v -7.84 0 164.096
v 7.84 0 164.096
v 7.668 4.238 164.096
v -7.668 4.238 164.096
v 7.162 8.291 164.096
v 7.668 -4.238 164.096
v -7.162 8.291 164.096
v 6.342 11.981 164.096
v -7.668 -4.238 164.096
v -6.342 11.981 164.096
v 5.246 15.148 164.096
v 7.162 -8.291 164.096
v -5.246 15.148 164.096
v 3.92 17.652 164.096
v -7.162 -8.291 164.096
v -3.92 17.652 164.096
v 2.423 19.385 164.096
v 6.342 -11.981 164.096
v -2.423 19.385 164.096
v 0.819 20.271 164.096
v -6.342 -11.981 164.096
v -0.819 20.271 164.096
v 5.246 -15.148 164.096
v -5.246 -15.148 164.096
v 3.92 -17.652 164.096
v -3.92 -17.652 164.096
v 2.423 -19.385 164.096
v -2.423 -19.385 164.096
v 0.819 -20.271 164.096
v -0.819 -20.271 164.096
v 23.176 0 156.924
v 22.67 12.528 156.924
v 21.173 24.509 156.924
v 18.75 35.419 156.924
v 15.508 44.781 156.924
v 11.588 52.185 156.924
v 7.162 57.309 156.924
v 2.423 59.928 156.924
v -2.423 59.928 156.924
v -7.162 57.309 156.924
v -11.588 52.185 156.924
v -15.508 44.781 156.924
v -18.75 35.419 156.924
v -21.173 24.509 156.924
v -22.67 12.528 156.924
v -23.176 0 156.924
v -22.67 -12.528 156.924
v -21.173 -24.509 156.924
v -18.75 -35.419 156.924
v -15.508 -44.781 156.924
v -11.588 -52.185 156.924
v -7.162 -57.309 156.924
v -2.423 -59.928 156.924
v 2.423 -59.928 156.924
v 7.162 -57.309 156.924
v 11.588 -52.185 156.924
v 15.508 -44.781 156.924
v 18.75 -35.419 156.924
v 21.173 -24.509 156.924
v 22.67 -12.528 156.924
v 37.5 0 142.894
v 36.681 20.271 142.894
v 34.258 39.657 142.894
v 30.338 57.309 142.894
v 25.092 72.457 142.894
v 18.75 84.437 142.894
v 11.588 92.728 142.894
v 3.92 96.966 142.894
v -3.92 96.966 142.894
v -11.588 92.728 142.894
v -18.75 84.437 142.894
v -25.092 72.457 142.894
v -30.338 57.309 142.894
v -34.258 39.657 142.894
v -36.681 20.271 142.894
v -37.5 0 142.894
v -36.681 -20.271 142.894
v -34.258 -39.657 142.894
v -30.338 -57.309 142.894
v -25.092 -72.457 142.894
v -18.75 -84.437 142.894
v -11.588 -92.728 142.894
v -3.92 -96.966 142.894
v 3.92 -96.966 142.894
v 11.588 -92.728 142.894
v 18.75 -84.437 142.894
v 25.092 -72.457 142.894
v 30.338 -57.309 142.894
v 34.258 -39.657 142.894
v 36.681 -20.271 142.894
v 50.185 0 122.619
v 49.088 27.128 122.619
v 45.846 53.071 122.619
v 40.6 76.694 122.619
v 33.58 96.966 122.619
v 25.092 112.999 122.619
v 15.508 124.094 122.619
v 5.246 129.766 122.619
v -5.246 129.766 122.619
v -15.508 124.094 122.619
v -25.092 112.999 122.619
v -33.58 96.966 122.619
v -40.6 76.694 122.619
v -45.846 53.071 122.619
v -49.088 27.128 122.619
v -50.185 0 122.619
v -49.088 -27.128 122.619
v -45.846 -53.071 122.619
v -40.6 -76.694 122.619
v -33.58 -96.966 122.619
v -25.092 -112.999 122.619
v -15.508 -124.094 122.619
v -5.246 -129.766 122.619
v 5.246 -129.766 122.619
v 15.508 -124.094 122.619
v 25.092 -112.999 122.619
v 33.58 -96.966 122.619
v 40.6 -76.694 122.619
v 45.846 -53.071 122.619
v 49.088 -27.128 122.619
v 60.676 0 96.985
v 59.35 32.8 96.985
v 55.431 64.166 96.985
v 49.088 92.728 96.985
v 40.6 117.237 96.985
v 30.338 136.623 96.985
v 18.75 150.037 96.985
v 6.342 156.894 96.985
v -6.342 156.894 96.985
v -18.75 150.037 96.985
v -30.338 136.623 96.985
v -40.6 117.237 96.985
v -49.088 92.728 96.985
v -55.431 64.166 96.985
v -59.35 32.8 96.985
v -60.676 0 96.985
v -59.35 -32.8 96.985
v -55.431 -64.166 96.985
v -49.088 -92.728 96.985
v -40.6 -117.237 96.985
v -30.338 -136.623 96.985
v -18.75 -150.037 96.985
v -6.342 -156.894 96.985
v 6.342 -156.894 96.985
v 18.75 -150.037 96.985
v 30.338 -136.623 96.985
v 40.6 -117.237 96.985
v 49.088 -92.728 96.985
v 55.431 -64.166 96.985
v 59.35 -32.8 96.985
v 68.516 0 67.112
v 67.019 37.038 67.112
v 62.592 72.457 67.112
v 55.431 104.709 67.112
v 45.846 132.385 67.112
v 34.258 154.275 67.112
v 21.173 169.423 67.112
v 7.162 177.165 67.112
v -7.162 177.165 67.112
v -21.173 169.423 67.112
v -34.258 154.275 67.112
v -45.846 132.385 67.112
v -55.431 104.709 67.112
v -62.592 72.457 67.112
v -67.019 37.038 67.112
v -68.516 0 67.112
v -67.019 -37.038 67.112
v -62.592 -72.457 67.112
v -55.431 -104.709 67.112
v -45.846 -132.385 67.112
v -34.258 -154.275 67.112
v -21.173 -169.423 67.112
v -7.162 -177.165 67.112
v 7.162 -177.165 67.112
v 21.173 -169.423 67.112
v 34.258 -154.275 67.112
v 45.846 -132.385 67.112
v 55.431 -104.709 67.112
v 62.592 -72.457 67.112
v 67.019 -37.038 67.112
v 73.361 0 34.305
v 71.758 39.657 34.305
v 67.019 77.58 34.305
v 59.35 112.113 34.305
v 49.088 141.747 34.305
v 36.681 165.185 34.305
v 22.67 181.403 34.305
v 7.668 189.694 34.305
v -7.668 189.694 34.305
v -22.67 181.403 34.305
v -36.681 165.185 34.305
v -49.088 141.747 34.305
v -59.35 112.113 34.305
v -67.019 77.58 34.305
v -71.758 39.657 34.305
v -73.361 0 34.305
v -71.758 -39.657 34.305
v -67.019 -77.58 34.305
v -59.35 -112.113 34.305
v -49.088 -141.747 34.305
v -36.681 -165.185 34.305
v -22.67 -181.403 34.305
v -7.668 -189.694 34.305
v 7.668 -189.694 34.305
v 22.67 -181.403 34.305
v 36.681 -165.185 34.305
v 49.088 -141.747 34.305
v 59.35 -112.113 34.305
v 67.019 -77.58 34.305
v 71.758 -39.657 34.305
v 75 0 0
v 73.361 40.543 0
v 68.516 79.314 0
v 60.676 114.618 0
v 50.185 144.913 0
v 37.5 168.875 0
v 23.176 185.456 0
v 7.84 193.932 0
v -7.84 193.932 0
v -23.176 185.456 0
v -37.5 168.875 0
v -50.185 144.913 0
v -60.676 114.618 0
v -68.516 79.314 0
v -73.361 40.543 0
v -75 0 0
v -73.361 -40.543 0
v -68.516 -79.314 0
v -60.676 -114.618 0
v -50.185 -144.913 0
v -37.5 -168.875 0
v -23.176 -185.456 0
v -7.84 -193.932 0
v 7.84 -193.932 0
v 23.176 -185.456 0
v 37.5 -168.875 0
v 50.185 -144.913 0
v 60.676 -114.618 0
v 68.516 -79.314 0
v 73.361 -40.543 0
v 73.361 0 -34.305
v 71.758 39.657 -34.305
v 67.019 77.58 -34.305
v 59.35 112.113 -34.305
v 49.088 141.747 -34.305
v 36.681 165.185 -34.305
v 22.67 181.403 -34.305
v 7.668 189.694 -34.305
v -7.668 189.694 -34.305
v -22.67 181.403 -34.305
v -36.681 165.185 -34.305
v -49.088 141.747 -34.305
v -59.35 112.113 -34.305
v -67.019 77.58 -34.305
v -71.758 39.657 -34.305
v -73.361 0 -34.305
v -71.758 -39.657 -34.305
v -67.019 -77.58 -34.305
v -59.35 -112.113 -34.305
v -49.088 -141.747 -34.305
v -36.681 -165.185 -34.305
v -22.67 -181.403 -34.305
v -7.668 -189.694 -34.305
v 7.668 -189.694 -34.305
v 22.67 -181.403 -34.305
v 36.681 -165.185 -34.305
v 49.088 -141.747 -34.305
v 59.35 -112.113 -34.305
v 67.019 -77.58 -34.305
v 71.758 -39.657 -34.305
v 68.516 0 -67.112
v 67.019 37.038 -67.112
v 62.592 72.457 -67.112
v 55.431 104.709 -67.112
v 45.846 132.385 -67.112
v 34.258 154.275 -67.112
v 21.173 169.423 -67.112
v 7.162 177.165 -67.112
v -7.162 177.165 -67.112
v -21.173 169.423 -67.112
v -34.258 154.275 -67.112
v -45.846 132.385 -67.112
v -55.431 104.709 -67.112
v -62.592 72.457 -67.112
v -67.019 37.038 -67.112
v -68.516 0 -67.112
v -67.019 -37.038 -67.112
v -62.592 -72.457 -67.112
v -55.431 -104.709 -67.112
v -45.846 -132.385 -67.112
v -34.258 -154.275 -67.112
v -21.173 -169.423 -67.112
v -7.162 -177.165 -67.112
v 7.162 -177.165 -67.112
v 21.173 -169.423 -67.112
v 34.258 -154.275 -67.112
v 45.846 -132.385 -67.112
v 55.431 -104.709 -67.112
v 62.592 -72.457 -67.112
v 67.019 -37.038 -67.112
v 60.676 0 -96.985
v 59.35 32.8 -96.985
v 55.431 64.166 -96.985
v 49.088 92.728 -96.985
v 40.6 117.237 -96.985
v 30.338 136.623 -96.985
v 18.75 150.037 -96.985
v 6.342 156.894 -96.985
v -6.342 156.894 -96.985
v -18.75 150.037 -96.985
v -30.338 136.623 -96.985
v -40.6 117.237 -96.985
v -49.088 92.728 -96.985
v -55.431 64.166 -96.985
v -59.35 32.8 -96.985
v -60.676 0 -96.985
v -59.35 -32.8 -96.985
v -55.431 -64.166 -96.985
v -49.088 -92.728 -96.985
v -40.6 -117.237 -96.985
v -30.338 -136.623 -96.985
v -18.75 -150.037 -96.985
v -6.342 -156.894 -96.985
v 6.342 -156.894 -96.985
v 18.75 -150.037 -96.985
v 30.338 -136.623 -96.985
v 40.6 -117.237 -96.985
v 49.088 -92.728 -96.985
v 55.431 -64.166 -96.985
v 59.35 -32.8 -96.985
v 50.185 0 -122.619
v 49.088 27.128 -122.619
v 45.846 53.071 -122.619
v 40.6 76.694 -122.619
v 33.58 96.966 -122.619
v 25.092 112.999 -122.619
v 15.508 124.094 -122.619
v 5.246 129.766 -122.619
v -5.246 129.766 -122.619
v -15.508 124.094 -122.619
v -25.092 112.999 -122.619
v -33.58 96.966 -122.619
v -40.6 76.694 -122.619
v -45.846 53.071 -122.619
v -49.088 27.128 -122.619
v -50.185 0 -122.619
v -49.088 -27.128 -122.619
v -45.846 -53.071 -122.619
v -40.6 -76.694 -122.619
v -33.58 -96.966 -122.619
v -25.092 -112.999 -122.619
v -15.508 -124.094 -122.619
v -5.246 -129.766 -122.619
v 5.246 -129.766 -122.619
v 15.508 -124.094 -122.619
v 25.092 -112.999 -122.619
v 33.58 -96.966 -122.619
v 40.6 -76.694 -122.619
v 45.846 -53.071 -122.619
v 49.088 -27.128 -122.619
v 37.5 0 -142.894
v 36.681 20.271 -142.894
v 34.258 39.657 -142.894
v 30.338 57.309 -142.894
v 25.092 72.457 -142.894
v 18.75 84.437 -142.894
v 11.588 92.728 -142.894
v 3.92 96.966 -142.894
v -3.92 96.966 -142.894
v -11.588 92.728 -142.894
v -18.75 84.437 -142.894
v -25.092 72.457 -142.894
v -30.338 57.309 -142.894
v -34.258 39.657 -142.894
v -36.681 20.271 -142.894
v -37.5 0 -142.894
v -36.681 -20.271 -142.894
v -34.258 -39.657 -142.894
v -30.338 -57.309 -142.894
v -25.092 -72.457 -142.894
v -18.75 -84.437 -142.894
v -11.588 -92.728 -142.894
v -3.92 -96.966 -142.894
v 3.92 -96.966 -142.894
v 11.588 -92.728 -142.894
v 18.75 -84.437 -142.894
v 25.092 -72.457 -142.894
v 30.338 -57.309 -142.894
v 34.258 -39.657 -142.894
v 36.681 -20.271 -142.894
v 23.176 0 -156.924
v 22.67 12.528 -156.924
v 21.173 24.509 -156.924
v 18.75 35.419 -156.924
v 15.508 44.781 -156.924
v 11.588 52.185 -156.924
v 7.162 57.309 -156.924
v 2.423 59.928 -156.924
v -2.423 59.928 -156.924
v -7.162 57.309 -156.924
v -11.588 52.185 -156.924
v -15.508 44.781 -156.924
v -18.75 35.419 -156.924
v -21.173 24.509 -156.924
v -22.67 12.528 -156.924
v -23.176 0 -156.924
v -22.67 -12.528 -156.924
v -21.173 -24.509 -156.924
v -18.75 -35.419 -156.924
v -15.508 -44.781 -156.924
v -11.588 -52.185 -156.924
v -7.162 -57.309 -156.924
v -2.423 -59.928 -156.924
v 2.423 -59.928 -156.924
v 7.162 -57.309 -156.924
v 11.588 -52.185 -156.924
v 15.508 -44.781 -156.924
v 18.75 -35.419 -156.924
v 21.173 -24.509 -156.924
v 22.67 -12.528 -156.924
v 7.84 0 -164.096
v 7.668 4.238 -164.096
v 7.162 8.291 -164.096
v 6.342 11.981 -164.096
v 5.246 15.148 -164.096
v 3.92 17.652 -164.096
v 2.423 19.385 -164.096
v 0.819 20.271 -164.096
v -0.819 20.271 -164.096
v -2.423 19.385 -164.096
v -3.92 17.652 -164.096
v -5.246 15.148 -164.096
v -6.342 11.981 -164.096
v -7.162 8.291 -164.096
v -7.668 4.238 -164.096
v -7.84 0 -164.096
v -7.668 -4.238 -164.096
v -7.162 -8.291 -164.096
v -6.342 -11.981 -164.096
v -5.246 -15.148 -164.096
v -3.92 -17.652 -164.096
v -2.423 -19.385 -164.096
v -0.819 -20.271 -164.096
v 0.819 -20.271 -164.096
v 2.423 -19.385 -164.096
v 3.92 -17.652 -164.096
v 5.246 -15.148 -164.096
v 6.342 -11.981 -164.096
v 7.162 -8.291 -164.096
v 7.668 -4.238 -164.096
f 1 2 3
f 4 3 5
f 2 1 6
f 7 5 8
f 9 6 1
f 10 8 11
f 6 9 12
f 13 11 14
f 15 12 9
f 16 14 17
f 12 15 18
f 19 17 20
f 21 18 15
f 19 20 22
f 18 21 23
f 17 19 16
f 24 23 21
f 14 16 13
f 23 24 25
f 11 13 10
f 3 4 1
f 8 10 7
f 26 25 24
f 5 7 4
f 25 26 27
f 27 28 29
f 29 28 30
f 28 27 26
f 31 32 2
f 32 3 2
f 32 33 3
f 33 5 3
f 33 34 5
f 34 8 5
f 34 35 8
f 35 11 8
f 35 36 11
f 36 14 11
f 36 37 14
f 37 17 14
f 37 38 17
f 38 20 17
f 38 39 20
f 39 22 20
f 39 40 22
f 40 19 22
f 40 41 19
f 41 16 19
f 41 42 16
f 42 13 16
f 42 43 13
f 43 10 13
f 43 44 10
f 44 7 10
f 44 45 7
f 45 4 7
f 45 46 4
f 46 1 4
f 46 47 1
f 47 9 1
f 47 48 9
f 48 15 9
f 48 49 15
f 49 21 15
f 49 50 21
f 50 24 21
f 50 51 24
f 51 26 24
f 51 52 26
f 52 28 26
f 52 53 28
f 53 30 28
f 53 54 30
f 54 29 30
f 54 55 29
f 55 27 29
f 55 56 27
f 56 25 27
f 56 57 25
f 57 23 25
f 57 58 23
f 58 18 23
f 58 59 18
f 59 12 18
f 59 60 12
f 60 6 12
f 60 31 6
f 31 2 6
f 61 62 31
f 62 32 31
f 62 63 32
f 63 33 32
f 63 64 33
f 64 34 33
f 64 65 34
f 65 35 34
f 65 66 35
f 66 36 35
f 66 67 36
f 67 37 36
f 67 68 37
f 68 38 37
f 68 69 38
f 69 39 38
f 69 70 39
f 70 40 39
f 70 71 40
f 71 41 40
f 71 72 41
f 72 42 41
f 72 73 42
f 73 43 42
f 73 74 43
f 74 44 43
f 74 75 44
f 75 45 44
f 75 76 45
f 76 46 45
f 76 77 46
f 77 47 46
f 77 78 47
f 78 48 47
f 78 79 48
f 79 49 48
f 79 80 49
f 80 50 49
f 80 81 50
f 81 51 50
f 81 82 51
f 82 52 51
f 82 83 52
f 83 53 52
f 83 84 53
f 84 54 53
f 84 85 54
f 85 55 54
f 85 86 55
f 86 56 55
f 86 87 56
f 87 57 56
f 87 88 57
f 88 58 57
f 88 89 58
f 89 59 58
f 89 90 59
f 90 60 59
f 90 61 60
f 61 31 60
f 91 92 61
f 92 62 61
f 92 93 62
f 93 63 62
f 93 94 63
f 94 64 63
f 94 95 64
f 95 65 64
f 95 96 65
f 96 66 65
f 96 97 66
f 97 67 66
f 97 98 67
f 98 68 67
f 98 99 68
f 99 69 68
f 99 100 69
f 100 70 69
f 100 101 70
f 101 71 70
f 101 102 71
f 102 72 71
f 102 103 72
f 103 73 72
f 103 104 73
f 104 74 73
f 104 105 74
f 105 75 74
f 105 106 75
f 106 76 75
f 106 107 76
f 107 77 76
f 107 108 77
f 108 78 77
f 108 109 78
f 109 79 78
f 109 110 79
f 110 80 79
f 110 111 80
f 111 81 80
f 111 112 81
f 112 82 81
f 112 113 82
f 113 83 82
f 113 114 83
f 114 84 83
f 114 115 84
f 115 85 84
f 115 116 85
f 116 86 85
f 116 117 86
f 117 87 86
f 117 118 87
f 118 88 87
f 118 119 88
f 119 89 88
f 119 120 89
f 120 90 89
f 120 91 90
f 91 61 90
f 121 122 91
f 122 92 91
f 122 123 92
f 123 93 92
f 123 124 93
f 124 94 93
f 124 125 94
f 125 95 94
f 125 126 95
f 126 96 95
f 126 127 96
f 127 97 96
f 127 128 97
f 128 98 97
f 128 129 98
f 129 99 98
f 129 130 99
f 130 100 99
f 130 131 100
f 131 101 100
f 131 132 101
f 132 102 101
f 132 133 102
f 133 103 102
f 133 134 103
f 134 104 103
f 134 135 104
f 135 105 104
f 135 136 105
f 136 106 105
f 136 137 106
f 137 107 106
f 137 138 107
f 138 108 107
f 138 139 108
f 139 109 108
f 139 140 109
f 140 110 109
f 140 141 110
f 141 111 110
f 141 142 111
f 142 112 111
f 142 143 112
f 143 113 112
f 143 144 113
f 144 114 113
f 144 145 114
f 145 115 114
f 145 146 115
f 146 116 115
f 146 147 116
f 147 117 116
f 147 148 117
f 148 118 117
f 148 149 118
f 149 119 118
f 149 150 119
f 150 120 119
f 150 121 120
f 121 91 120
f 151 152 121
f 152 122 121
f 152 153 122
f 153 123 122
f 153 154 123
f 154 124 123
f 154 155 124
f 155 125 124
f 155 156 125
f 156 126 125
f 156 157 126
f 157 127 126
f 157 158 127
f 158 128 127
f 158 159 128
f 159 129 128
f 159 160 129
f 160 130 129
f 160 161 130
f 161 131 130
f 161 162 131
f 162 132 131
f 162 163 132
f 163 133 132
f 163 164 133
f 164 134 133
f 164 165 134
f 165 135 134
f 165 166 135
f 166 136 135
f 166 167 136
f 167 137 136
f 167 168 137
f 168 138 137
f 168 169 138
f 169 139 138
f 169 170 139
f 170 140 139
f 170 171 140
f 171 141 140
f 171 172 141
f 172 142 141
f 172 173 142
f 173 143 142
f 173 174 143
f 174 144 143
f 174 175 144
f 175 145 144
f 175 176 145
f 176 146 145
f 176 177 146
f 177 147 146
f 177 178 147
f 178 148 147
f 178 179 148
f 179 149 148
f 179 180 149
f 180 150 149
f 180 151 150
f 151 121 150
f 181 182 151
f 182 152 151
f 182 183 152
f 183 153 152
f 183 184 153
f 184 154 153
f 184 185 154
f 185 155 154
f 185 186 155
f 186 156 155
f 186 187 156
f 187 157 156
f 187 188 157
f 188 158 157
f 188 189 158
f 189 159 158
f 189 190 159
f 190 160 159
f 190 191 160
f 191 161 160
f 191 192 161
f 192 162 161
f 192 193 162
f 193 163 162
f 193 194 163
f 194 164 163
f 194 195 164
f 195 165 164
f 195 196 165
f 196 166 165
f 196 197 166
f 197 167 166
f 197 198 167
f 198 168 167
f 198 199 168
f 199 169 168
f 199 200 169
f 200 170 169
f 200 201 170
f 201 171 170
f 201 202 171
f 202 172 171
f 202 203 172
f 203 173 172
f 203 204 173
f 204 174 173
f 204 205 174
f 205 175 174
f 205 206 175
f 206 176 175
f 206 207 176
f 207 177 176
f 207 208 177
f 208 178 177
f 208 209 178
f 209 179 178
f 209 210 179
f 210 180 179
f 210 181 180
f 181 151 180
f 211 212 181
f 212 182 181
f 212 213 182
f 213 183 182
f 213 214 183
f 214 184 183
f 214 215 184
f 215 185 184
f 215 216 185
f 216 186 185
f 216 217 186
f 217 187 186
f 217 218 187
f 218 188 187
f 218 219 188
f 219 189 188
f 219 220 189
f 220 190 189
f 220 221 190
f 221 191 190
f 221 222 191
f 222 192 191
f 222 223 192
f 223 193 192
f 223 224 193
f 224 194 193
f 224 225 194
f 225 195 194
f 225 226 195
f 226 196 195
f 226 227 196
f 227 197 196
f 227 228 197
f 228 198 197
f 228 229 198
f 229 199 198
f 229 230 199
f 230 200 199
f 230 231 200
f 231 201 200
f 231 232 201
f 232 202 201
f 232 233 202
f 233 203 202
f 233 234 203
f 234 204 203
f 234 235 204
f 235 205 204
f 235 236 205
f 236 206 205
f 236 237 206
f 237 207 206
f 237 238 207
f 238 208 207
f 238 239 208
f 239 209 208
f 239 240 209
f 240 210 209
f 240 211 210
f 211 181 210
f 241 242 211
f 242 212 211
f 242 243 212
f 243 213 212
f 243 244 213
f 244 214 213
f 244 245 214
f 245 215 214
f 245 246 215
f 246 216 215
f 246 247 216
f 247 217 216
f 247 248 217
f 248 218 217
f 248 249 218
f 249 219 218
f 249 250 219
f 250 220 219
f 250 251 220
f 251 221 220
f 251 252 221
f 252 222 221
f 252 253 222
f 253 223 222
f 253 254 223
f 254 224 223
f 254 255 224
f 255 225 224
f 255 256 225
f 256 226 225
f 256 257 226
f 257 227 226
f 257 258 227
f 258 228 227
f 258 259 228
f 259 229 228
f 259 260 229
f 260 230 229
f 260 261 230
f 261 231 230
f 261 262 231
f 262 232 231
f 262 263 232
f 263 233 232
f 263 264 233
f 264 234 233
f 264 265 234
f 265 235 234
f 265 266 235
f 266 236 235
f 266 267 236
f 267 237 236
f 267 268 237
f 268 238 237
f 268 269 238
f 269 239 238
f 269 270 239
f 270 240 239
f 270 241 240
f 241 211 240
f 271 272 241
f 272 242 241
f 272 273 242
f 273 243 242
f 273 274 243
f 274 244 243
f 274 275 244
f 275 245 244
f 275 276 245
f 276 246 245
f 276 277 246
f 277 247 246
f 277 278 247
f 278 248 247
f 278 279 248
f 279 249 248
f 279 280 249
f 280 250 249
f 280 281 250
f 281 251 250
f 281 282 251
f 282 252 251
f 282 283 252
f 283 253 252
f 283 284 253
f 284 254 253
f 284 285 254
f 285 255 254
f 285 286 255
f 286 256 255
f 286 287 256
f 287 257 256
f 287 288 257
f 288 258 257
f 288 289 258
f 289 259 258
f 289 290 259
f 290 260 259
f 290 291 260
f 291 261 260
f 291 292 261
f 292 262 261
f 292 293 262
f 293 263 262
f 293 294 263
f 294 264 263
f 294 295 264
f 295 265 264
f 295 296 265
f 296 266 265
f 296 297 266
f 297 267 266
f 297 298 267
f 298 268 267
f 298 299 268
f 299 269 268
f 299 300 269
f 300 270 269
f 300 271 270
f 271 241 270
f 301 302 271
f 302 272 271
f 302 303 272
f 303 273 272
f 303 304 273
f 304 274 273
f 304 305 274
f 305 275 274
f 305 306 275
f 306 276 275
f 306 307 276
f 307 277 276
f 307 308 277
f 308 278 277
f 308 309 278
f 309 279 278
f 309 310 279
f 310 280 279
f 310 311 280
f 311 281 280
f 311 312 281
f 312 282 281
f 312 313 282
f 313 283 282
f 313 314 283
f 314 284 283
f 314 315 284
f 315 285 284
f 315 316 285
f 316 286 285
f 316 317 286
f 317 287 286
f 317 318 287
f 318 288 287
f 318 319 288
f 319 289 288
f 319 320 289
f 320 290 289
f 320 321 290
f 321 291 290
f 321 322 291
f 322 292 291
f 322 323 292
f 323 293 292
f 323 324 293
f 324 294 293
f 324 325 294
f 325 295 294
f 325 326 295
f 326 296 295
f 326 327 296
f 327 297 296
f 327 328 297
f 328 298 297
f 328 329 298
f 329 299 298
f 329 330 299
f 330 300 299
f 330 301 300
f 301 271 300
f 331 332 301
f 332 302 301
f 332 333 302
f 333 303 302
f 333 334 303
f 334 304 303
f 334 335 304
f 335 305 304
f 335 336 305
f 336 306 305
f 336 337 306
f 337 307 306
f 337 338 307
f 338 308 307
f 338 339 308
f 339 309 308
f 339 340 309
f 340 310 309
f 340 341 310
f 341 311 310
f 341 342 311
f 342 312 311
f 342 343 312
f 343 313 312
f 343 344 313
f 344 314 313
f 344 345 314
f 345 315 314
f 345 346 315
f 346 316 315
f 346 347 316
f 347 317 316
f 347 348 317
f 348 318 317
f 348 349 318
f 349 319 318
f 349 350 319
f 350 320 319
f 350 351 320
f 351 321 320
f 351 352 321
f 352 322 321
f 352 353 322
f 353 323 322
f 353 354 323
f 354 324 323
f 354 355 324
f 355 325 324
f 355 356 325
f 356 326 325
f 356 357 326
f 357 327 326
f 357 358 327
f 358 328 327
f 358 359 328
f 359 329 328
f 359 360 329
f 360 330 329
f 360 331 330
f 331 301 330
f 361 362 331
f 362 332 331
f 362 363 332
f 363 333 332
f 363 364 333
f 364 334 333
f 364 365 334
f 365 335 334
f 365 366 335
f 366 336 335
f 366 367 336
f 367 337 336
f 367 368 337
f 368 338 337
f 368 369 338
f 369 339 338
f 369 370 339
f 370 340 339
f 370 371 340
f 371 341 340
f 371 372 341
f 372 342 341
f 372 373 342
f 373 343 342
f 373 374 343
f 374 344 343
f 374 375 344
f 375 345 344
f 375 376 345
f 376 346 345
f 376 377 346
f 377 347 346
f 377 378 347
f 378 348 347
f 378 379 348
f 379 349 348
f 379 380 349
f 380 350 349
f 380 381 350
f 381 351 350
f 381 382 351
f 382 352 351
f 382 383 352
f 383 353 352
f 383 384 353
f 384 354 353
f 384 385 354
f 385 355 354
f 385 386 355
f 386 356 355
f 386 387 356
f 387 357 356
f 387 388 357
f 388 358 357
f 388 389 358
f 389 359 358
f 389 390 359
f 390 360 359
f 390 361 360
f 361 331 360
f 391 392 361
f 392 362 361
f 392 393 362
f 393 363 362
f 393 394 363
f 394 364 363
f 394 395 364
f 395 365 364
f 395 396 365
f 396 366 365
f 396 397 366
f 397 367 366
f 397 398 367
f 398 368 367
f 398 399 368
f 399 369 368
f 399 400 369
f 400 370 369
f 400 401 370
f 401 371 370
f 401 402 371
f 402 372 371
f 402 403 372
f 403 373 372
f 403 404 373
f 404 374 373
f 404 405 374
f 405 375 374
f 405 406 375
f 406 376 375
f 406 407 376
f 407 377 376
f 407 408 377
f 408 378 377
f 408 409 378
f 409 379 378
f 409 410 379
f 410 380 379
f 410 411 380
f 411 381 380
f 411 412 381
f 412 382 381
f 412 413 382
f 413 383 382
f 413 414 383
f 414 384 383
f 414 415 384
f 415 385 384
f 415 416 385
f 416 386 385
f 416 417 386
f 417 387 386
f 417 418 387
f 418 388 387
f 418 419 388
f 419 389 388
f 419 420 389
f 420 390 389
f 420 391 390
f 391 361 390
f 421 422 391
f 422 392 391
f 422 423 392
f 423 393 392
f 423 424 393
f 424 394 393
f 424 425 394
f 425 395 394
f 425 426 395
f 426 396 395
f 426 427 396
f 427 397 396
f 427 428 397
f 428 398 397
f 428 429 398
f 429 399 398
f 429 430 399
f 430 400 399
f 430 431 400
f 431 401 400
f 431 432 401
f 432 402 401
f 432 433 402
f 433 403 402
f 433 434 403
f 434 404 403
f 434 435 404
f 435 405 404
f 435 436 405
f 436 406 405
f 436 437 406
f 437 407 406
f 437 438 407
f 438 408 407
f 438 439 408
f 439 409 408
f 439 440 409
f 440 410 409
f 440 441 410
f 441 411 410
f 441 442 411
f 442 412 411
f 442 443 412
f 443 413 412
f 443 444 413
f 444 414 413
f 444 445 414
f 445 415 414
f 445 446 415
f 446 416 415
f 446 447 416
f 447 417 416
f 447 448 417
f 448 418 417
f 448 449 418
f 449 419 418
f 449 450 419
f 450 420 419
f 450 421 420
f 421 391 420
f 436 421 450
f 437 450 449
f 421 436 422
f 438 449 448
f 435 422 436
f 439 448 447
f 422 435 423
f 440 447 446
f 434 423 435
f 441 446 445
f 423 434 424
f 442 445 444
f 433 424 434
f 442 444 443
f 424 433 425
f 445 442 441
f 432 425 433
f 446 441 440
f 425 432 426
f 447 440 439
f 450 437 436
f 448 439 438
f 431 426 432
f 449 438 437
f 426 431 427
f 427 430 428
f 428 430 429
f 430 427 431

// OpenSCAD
// Generated by SolidPython 1.0.1 on 2020-07-29 00:46:46


scale(v = [5, 13, 11]) {
	sphere(r = 15);
}
/***********************************************
*********      SolidPython code:      **********
************************************************
 
# import packages: SolidPython
from solid import *
from solid.utils import *
from itertools import chain, combinations, permutations


class Resize:

    def __init__(self, scad_file):
        self.scad_file = scad_file
        #self.scad_file = import_scad(scad_file)
        # cone/cylinder param:
        self.r1 = 0
        self.r2 = 0
        self.h = 0
        # rectangular prism param:
        self.w = 0
        self.l = 0
        # ellipse param:
        self.r = 0

    # import OpenScad code (file name corresponds to shape)


    # classify shape + parameters
    def assign(self, param1, param2, param3):
        if self.scad_file == 'cone.scad':
            self.r1 = param1
            self.r2 = param2
            self.h = param3
        elif self.scad_file == 'cylinder.scad':
            self.r1 = param1
            self.r2 = param2
            self.h = param3
        elif self.scad_file == 'rectangularPrism.scad':
            self.h = param1
            self.l = param2
            self.w = param3
        else:
            self.r = param1
            self.h = param2

    # resize parameters
    def iterate(self):
        x = range(3, 20, 2)
        i = 1
        if self.scad_file == 'cone.scad':
            tempList = list(permutations(x, 2))
            for temp in tempList:
                param1 = temp[0]
                param2 = temp[1]
                filepath = 'produced_scad_files/' + 'cone' + str(param1) + '_' + str(param2) + '_' + '.scad'
                scad_render_to_file(cylinder(h=param1, r1=param2, r2=0), filepath)

        elif self.scad_file == 'cylinder.scad':
            tempList = list(permutations(x, 3))
            for temp in tempList:
                param1 = temp[0]
                param2 = temp[1]
                filepath = 'produced_scad_files/' + 'cylinder' + str(param1) + '_' + str(param2) + '_' + '.scad'
                scad_render_to_file(cylinder(h=param1, r1=param2, r2=param2), filepath)

        elif self.scad_file == 'rectangularPrism.scad':
            tempList = list(permutations(x, 3))
            for temp in tempList:
                param1 = temp[0]
                param2 = temp[1]
                param3 = temp[2]
                filepath = 'produced_scad_files/' + 'rectangularPrism' + str(param1) + '_' + str(param2) + '_' + str(
                    param3) + '.scad'
                scad_render_to_file(cube(size=(param1, param2, param3)), filepath)

        elif self.scad_file == 'ellipse.scad':
            tempList = list(permutations(x, 4))
            for temp in tempList:
                param1 = temp[0]
                param2 = temp[1]
                param3 = temp[2]
                param4 = temp[3]
                filepath = 'produced_scad_files/' + 'ellipse' + str(param1) + '_' + str(param2) + '_' + str(param3) + '_' + str(param4) + '.scad'
                scad_render_to_file(scale([param1, param2, param3])(sphere(r=param4)), filepath)

    def render_to_scadfile(self):
        scad_render_to_file(scad, 'example.scad') 
 
************************************************/
